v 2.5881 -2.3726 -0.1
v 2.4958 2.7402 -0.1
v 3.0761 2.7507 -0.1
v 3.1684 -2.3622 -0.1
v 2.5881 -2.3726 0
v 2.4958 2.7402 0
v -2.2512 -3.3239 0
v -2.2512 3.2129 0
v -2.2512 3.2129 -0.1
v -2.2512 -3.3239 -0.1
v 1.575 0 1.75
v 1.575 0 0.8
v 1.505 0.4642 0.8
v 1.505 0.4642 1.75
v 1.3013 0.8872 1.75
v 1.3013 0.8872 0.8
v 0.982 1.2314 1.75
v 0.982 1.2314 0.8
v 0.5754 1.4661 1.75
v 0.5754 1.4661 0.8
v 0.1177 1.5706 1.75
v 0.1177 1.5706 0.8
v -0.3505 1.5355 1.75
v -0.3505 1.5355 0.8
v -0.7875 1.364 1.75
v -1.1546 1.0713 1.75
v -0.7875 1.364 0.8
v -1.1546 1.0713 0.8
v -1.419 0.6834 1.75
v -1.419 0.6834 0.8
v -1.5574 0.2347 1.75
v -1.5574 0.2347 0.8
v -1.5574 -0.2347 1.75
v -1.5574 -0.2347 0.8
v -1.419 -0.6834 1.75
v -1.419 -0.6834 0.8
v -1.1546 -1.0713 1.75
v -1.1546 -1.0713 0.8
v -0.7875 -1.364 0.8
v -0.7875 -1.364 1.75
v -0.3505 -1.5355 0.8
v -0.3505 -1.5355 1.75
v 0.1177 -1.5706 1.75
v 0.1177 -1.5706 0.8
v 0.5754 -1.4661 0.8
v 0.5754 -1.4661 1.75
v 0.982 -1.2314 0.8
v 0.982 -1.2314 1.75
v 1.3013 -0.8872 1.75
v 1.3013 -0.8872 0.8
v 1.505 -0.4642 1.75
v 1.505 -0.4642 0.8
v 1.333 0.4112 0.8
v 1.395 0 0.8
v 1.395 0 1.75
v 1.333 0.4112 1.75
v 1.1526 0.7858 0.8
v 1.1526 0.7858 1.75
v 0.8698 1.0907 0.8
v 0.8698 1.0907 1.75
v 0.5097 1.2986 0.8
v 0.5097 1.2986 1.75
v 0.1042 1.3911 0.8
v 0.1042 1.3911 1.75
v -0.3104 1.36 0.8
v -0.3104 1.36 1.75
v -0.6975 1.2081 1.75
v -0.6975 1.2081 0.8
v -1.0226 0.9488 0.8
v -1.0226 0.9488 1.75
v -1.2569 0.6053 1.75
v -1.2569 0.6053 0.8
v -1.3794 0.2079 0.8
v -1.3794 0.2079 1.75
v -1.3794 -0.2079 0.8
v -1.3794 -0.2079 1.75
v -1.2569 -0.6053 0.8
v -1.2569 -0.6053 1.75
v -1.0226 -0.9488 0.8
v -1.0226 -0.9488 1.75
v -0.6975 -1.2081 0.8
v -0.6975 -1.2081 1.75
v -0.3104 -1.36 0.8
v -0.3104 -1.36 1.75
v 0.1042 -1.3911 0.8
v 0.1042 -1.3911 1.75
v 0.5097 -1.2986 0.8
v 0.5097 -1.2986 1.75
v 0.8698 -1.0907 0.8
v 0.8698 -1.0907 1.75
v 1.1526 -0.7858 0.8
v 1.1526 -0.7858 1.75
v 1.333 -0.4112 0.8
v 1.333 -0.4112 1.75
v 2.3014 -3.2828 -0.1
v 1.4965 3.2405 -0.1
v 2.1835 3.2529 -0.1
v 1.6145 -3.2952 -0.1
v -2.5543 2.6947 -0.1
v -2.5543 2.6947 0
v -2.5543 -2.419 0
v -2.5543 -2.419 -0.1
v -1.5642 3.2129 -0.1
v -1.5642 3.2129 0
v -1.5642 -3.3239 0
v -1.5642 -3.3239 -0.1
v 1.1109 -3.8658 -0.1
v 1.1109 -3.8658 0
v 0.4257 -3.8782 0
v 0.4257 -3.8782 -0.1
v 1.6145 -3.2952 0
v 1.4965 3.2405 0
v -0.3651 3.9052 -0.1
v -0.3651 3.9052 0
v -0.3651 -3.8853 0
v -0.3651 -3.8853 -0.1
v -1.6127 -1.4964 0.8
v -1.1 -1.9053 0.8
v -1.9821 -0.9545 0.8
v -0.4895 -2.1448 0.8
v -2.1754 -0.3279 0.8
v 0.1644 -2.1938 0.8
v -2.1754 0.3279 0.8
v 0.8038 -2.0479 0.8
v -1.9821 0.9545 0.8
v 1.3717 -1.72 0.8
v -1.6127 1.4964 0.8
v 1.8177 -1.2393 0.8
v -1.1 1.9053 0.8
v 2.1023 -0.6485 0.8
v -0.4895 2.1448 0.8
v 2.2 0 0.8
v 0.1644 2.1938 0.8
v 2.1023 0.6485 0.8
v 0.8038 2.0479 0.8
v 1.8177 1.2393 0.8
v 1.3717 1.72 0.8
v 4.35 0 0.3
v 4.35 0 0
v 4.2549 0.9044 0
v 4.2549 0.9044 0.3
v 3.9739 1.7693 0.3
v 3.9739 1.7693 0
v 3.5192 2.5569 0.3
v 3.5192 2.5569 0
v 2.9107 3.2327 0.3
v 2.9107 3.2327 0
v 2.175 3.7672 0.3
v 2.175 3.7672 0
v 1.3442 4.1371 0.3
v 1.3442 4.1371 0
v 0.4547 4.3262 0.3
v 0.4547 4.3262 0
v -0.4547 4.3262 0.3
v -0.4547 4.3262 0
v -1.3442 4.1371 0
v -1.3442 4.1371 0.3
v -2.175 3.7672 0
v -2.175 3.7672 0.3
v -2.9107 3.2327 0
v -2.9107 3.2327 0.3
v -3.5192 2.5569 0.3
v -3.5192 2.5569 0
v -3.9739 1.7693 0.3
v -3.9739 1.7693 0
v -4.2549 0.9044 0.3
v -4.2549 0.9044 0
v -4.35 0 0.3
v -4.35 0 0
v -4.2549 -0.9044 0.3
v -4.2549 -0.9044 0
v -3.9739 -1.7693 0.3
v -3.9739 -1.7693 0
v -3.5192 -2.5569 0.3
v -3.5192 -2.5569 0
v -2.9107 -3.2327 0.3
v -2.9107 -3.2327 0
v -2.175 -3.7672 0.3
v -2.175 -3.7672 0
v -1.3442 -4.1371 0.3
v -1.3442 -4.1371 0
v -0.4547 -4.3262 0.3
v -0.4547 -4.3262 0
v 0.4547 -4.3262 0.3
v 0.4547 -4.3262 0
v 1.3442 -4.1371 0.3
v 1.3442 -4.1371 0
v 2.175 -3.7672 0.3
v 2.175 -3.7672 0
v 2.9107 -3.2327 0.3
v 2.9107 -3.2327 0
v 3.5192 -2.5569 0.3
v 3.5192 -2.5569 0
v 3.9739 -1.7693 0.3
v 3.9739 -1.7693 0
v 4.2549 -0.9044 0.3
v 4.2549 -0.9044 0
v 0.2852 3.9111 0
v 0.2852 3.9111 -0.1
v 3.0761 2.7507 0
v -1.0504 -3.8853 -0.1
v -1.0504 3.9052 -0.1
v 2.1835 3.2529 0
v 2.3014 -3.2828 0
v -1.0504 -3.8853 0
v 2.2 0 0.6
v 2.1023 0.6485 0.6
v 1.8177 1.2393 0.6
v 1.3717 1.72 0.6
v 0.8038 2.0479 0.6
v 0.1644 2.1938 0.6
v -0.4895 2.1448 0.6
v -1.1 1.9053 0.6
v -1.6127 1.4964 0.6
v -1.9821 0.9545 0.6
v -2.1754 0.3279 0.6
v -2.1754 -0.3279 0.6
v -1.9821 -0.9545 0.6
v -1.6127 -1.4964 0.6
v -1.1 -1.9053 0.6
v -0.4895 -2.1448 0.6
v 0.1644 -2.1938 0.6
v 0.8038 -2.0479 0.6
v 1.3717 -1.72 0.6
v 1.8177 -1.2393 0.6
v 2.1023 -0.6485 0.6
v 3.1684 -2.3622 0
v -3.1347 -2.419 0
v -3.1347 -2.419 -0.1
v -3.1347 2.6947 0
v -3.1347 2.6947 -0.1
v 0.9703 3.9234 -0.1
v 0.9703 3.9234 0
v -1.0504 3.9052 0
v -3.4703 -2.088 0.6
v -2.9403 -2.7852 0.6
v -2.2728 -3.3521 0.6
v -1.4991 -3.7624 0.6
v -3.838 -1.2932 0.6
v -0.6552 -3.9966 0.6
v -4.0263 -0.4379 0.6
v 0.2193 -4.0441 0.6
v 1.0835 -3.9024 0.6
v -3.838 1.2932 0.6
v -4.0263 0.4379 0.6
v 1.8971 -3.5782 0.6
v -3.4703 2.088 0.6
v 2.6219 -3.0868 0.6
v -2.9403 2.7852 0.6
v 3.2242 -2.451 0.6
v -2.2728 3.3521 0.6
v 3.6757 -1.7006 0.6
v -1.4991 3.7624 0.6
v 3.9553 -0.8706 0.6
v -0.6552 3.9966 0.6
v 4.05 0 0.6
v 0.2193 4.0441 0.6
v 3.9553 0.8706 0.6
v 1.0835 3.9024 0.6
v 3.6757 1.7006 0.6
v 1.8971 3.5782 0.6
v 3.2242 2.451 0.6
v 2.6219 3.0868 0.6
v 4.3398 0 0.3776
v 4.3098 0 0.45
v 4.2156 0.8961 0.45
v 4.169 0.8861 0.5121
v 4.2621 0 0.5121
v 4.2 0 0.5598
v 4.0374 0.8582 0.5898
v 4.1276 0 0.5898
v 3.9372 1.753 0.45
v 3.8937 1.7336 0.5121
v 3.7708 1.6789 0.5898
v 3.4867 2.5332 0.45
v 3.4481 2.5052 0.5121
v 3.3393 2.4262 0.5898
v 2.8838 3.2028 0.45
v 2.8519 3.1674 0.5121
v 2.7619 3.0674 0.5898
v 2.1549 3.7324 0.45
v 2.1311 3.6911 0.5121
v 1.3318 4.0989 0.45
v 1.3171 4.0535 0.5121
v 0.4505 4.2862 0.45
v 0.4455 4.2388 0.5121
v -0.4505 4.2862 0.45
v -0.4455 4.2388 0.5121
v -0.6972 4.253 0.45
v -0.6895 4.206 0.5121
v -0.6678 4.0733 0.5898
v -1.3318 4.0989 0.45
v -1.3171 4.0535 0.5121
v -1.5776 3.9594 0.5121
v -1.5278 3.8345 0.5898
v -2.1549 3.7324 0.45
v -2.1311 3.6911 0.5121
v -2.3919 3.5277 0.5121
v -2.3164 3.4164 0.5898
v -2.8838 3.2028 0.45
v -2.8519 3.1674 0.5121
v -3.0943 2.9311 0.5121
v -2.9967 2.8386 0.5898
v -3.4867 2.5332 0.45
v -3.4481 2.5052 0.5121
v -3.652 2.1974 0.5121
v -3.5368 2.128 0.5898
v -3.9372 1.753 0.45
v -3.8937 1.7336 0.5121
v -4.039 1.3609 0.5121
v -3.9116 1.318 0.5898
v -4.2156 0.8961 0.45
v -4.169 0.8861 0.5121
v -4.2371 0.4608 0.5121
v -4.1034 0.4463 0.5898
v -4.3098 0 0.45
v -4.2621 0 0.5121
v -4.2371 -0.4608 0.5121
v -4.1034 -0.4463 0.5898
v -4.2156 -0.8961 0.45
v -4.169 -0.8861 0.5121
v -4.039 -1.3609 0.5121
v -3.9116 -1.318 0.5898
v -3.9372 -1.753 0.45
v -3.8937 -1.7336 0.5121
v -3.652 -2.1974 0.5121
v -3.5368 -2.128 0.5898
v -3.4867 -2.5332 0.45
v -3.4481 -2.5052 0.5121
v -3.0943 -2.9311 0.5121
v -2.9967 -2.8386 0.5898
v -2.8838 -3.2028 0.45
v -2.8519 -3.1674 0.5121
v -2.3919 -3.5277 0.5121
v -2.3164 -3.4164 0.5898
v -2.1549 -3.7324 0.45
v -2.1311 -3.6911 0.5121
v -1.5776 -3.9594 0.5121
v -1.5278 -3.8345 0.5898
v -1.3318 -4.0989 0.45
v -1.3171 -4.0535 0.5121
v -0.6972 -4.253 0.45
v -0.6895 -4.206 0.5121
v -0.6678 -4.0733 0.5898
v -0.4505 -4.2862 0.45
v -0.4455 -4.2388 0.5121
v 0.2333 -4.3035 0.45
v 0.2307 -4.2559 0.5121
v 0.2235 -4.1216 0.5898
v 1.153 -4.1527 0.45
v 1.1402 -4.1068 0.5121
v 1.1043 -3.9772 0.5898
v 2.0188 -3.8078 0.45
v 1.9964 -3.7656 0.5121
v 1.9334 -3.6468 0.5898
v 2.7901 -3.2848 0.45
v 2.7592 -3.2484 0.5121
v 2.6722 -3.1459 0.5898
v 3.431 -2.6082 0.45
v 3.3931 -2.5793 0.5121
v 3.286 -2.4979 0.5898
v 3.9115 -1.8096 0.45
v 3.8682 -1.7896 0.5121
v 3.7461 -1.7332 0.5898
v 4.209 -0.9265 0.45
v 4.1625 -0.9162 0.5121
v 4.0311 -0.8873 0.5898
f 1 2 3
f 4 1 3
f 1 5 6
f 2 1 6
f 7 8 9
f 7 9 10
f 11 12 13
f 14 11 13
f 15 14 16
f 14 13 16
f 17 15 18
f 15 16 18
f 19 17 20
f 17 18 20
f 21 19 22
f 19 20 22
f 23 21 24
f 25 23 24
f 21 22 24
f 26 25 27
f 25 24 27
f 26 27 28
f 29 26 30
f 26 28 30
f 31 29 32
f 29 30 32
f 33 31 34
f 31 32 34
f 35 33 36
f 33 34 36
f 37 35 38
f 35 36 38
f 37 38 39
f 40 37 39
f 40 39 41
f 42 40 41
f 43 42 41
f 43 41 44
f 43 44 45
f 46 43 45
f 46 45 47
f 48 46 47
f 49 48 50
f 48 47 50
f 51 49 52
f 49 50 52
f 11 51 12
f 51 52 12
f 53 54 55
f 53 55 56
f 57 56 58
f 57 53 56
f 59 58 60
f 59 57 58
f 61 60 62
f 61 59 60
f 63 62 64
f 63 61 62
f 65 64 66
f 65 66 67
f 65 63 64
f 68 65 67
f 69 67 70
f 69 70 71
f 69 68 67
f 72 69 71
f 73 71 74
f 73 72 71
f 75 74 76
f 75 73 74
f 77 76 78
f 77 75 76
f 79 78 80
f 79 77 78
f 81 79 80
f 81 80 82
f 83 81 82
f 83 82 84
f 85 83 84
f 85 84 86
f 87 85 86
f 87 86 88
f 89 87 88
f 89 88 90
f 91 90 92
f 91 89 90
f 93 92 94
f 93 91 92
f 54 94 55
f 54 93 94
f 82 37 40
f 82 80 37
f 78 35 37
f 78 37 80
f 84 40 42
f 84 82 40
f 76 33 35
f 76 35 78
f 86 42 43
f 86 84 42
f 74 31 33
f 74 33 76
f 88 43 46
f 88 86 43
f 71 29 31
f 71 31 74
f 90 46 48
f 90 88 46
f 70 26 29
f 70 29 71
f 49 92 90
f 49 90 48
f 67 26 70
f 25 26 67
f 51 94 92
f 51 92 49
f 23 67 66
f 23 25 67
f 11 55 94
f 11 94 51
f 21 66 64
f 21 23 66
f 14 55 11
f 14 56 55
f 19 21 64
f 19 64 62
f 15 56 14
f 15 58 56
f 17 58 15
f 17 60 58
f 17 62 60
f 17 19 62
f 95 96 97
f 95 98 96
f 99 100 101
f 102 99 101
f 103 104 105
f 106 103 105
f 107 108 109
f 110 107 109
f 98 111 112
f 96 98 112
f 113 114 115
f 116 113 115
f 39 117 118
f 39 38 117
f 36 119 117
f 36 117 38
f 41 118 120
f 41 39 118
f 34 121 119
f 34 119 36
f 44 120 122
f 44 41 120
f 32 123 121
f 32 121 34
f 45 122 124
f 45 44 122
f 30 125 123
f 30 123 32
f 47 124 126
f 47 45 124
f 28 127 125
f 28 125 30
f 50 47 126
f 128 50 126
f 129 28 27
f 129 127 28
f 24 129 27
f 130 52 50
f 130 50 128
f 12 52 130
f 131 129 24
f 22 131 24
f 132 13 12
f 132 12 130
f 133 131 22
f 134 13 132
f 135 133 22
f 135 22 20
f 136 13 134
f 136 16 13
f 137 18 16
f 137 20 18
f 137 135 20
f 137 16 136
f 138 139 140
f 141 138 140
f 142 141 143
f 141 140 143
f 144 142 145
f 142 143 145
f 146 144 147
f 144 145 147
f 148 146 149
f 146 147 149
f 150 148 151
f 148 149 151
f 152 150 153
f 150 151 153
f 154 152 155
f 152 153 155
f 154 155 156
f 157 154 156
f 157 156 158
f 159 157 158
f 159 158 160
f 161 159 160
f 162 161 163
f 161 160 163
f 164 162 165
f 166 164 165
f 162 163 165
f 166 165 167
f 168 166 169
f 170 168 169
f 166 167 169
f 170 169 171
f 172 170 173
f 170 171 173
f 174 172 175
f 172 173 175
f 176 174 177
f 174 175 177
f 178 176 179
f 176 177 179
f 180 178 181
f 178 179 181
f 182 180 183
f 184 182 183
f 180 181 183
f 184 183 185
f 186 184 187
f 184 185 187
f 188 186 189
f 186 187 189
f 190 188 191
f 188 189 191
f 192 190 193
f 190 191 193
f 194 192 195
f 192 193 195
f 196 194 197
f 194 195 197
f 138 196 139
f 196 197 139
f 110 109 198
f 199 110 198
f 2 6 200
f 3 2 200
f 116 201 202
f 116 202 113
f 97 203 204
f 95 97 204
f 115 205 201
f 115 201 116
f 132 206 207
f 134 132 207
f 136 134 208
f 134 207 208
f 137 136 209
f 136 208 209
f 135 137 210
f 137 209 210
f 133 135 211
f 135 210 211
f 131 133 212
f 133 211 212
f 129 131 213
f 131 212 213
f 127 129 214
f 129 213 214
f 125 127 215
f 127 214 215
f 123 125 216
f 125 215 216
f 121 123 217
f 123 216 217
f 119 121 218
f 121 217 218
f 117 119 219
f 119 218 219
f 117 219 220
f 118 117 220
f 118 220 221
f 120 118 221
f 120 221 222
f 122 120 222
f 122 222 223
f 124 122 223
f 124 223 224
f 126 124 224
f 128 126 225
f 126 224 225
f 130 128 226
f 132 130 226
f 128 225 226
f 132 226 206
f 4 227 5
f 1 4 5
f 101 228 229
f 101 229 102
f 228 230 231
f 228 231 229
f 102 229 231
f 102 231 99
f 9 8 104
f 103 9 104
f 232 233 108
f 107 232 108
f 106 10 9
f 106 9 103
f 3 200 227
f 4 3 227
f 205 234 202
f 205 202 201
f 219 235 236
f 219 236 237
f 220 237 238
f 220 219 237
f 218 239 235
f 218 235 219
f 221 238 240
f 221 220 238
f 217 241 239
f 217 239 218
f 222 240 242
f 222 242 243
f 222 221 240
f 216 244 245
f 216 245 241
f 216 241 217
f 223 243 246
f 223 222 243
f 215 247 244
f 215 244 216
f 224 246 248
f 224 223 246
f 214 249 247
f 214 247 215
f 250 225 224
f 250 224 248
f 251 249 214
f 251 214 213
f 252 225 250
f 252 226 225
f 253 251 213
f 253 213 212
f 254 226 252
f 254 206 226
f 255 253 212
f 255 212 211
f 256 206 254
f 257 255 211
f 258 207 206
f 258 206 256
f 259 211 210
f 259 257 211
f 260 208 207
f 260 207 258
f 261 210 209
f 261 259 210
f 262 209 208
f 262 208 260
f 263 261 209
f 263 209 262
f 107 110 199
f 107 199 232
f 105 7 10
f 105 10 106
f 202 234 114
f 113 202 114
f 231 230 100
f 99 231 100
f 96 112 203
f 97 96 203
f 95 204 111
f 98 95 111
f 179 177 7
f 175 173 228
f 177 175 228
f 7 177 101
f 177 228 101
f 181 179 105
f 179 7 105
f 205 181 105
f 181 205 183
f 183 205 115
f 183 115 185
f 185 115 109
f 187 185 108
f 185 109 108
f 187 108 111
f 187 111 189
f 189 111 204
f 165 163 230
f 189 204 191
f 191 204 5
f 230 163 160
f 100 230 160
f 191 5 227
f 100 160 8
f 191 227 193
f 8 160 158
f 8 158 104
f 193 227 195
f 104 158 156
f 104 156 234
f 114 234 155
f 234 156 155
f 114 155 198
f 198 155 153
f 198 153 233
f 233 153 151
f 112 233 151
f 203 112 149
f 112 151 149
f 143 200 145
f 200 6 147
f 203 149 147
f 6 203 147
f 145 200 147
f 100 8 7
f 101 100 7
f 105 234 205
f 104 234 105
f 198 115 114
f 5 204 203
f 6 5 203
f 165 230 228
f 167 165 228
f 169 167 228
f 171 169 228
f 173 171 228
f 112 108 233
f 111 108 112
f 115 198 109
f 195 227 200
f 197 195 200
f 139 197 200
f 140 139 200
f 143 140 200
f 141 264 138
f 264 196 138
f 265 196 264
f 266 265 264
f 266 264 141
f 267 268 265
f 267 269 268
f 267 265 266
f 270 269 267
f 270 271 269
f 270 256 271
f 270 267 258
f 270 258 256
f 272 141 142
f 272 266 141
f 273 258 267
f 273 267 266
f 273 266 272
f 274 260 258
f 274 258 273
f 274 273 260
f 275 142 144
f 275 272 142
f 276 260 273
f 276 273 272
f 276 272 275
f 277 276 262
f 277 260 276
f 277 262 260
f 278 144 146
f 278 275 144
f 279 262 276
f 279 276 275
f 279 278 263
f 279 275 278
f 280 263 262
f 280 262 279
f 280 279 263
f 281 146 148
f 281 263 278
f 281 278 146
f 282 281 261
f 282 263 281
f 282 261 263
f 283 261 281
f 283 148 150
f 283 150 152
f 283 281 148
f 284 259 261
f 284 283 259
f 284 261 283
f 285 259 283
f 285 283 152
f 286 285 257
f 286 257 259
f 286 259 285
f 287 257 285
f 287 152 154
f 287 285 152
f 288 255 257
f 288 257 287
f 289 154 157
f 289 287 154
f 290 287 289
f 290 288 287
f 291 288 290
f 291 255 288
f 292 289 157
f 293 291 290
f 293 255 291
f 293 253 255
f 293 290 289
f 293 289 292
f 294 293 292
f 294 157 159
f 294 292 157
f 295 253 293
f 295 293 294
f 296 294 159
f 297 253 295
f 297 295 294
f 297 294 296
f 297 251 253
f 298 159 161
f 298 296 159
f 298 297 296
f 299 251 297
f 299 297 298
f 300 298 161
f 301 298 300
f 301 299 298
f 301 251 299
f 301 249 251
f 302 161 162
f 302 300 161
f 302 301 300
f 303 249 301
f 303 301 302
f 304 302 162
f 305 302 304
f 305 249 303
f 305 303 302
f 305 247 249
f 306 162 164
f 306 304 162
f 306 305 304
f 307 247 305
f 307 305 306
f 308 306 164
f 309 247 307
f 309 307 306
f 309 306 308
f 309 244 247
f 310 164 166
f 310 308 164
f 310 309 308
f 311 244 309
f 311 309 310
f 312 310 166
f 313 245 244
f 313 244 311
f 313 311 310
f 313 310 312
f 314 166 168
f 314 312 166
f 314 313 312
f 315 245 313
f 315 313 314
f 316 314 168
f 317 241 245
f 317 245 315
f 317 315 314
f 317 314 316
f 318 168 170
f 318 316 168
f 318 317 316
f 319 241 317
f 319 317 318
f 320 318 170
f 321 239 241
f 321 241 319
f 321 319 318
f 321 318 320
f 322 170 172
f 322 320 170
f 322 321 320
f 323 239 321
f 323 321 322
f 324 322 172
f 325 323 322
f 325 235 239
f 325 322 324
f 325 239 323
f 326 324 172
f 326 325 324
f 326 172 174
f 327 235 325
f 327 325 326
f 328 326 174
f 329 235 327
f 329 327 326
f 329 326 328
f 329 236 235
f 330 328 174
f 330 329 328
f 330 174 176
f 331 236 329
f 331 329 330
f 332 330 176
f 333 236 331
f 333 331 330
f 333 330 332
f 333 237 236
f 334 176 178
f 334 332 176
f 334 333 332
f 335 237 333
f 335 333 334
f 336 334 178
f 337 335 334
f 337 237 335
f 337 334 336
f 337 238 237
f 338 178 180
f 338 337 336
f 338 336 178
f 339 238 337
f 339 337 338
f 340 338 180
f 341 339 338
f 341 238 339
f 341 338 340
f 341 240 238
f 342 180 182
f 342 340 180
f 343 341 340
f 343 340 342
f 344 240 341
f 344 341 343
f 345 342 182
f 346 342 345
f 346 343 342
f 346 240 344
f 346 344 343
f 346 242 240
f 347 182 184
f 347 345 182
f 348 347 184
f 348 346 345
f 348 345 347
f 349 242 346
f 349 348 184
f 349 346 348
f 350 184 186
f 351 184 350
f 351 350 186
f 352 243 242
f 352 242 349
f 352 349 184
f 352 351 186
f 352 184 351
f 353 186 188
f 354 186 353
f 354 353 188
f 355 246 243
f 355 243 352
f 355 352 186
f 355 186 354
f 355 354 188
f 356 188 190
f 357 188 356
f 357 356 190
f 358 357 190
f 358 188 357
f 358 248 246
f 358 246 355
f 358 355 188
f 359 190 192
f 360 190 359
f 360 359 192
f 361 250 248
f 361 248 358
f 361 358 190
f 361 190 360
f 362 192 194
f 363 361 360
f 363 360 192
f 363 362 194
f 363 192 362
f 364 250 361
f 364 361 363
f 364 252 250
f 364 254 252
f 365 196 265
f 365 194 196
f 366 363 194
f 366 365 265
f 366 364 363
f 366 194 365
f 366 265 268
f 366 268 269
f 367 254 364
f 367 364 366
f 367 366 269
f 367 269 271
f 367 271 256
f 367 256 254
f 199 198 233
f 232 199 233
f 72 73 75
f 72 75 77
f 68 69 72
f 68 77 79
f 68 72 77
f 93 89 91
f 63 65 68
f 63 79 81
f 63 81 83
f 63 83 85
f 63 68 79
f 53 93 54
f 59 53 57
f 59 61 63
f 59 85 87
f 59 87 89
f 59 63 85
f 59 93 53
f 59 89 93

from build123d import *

# Parameters (mm, degrees)
F0_R     = 4.35
F1_DEPTH = 0.6
F2_R     = 2.2
F3_DEPTH = 0.2
F4_R     = 1.575
F4_R_2   = 1.395
F5_DEPTH = 0.95
F6_R     = 0.3
F7_W     = 0.580366
F7_H     = 5.113698
F7_W_2   = 0.687054
F7_H_2   = 6.536799
F7_W_3   = 0.685261
F7_H_3   = 7.790487
F8_DEPTH = 0.1


with BuildPart() as f1:
    # F0 (on Top) → F1 (new body)
    with BuildSketch(Plane.XY):
        Circle(F0_R)
    extrude(amount=F1_DEPTH)

    # F2 (on face) → F3 (join)
    with BuildSketch(Plane.XY.offset(0.6)):
        Circle(F2_R)
    extrude(amount=F3_DEPTH)

    # F4 (on face) → F5 (join)
    with BuildSketch(Plane.XY.offset(0.8)):
        Circle(F4_R)
        Circle(F4_R_2, mode=Mode.SUBTRACT)
    extrude(amount=F5_DEPTH)

    # F6
    f6_edges = [f1.edges().sort_by_distance(p)[0] for p in [
        (-4.35, 0, 0.6),
    ]]
    fillet(f6_edges, radius=F6_R)

    # F7 (on face) → F8 (join)
    with BuildSketch(Plane(origin=(0, 0, 0), x_dir=(1, 0, 0), z_dir=(0, 0, -1))):
        with Locations((-2.84447, -0.137814)):
            Rectangle(F7_W, F7_H)
        with Locations((-1.907698, 0.055486)):
            Rectangle(F7_W_2, F7_H_2)
        with Locations((-0.707726, -0.009958)):
            Rectangle(F7_W_3, F7_H_3)
        Polygon((1.110889, 3.865785), (0.42574, 3.878151), (0.285162, -3.911068), (0.970312, -3.923433), align=None)
        Polygon((1.496535, -3.24053), (2.183477, -3.252928), (2.301432, 3.282806), (1.61449, 3.295204), align=None)
        Polygon((3.168388, 2.362162), (2.588117, 2.372634), (2.495842, -2.740231), (3.076113, -2.750704), align=None)
    extrude(amount=F8_DEPTH)


solid = f1.part
